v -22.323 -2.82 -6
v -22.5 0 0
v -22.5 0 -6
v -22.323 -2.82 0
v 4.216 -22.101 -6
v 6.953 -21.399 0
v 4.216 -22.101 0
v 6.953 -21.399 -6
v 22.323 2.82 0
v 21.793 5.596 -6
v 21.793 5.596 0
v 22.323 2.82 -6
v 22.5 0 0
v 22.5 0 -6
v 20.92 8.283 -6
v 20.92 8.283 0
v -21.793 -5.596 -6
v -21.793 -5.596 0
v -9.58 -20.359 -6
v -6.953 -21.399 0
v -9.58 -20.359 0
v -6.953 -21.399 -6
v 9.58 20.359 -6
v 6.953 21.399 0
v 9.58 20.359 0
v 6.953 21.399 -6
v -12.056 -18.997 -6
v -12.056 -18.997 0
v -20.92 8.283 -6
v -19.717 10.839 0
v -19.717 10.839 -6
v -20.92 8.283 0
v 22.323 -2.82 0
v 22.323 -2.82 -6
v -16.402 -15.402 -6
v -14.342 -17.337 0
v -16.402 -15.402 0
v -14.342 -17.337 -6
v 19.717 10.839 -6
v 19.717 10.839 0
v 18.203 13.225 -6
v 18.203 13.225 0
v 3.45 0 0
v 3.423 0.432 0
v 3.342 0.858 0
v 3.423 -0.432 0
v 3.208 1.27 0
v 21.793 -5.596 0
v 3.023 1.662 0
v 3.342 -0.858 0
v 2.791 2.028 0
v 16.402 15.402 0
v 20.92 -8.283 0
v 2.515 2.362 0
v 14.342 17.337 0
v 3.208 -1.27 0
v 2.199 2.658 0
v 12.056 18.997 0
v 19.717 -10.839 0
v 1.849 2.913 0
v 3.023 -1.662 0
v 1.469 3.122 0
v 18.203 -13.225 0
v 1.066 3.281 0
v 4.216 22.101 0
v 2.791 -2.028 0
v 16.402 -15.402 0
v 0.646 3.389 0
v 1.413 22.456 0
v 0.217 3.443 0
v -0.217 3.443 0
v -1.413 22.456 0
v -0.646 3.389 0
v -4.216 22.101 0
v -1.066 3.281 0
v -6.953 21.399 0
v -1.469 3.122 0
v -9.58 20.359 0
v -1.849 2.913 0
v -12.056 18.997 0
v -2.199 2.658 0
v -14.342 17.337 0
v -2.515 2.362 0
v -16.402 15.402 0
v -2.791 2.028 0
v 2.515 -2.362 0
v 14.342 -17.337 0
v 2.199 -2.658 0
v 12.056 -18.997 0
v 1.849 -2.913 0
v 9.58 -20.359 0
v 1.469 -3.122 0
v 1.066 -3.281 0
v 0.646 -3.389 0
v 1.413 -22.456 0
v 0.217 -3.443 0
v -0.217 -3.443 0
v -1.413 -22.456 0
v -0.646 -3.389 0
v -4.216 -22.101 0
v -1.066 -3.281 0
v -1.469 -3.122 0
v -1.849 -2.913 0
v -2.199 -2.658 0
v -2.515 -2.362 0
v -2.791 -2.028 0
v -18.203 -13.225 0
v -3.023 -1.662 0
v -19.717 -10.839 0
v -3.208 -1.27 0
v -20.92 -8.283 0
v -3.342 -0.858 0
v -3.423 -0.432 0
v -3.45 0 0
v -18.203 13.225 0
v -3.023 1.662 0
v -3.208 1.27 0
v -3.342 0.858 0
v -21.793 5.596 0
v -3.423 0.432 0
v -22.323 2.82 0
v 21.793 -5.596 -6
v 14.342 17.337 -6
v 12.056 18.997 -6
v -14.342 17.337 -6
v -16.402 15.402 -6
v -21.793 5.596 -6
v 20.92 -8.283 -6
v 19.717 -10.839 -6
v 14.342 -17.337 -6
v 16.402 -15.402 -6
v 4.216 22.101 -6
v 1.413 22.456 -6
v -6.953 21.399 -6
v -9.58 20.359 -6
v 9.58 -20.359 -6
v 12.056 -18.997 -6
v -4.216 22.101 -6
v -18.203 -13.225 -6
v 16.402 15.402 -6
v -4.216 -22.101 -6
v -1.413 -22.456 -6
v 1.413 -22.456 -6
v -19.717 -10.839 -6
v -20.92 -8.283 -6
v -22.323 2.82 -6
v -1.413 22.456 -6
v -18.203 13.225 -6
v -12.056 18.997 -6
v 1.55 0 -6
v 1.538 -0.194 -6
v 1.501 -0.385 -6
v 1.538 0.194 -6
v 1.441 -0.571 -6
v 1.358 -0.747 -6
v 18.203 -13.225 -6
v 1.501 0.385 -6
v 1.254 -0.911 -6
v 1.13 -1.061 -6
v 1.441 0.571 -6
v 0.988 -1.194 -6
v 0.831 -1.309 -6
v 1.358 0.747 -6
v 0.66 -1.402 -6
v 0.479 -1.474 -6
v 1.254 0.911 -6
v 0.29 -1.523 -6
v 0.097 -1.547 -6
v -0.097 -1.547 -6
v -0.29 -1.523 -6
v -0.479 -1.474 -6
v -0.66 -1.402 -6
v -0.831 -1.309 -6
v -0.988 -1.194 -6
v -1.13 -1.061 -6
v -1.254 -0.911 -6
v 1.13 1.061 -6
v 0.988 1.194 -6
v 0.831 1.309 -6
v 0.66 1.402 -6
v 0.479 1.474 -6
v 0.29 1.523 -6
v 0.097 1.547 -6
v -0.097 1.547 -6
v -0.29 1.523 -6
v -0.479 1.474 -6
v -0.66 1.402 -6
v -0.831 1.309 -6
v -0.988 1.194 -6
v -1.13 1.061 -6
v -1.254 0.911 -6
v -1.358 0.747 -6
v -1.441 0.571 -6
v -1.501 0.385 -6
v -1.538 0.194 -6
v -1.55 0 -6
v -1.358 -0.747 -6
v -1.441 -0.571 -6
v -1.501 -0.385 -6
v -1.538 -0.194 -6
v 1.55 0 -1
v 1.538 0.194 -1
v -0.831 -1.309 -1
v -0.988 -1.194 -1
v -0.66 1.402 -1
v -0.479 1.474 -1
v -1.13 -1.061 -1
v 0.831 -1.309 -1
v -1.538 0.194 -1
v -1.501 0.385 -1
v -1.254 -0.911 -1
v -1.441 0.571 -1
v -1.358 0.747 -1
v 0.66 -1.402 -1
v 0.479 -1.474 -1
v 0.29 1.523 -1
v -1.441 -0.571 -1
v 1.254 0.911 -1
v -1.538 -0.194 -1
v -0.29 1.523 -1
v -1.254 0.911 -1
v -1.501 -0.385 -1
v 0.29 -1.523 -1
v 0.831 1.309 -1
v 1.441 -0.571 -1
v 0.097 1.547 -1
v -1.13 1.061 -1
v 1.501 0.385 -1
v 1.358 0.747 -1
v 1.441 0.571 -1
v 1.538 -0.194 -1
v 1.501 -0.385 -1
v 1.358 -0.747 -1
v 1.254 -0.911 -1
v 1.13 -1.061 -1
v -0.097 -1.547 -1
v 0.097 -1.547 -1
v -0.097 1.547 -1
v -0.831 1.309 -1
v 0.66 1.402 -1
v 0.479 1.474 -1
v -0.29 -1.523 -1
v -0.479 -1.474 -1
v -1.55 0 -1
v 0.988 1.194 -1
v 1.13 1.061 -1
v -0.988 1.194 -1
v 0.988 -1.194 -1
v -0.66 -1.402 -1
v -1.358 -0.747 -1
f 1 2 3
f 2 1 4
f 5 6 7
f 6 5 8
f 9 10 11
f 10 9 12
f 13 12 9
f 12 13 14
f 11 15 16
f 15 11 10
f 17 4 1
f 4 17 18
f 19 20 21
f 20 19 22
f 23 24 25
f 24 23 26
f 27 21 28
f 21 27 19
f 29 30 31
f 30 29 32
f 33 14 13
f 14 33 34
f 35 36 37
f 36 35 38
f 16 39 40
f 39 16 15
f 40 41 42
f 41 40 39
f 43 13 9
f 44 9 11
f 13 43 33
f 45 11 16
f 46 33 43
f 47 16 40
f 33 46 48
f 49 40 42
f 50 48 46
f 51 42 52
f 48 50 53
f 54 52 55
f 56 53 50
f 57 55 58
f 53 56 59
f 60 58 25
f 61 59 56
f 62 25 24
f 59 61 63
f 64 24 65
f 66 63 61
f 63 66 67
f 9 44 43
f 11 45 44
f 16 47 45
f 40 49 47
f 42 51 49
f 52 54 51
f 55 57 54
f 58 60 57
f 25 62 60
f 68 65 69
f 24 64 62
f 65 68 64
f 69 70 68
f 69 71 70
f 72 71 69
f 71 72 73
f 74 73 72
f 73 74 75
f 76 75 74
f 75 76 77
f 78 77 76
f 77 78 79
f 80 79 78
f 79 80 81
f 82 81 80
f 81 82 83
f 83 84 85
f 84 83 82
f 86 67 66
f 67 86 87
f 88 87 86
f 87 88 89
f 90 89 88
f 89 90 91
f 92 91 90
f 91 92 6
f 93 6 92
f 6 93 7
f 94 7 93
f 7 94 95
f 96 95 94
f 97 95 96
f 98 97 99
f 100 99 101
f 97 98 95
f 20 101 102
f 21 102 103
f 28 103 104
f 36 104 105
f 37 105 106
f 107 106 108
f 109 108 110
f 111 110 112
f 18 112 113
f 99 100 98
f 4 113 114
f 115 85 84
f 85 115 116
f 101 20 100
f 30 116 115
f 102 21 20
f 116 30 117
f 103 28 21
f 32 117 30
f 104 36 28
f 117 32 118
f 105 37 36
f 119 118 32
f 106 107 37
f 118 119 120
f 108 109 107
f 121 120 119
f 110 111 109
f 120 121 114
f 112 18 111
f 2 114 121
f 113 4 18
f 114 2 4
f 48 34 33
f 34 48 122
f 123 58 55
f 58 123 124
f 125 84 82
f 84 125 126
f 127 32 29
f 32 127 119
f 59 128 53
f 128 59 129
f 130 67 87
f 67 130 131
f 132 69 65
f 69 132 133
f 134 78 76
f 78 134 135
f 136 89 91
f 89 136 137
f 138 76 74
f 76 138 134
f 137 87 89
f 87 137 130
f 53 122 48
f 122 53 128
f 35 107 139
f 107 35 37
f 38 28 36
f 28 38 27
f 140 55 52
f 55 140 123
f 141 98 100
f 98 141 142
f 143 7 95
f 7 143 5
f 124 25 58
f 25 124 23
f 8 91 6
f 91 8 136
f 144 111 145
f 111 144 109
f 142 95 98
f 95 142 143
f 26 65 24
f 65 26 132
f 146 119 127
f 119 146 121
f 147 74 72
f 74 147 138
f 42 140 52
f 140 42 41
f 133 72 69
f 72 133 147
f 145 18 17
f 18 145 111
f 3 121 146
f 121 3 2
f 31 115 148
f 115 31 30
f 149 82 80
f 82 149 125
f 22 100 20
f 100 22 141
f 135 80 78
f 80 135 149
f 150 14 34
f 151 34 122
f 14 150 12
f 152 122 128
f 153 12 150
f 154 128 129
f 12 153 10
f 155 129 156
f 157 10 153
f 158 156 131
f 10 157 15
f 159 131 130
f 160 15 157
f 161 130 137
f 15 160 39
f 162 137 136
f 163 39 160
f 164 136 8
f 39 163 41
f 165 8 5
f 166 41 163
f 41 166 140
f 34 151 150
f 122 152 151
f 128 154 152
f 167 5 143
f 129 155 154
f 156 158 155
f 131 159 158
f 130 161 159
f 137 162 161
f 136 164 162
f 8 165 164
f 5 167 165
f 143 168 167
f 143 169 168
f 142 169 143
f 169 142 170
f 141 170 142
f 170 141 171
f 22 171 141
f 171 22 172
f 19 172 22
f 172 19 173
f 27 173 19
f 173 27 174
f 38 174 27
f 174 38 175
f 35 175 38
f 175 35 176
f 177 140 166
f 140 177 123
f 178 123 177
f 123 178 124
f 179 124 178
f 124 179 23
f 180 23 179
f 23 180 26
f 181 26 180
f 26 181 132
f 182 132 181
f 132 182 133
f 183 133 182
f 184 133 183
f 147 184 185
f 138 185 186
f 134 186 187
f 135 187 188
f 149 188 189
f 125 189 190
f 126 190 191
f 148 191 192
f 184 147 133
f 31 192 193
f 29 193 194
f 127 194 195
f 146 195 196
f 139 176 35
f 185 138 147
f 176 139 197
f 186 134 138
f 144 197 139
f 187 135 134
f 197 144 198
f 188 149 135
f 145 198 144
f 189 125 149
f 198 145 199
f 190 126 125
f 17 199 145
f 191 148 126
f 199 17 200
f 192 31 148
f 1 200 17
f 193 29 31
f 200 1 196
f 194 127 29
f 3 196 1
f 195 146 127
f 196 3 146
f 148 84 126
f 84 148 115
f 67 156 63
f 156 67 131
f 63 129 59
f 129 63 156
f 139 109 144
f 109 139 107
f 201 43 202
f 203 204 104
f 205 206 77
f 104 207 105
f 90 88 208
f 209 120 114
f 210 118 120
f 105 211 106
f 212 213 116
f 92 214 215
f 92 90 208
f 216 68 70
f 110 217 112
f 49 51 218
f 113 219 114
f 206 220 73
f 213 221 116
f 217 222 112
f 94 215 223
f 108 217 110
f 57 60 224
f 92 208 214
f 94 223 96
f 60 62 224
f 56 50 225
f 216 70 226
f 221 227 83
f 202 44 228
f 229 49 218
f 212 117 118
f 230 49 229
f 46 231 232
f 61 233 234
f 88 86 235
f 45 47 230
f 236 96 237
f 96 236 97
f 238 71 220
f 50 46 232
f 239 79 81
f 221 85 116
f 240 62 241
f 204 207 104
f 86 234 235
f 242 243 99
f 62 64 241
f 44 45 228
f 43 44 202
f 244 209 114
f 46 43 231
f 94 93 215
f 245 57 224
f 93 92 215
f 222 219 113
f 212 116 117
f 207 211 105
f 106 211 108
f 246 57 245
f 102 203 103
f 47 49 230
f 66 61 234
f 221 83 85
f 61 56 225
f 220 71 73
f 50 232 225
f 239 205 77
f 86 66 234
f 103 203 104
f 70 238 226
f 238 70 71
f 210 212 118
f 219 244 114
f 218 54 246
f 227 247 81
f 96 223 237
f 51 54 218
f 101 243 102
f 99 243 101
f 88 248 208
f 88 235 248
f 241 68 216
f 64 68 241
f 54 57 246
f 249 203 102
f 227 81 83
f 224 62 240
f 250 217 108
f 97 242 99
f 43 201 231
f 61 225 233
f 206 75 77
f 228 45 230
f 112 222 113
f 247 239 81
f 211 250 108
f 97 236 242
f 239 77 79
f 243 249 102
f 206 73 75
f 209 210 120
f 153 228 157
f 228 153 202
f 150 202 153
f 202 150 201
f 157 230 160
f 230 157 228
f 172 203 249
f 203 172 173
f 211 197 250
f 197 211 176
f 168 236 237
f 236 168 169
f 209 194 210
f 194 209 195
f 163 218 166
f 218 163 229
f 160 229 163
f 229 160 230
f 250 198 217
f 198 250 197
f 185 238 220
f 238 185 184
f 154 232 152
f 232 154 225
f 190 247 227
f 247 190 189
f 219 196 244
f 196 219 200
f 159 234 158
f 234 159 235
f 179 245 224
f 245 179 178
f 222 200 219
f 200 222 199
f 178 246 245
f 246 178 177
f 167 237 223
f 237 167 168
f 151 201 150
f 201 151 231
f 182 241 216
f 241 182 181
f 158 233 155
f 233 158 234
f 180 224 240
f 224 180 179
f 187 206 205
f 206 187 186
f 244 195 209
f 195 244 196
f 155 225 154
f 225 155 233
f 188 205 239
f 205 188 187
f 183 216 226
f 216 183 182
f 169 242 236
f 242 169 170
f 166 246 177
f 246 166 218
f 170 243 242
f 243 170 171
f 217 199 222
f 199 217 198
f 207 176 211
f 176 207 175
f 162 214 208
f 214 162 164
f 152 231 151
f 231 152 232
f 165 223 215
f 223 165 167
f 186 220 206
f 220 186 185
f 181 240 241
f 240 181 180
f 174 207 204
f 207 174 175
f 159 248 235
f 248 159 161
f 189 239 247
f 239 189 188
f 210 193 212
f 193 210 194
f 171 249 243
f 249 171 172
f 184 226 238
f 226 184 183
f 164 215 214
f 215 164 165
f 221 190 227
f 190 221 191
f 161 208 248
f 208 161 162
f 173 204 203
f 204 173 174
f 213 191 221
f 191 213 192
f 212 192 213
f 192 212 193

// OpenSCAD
$fn = 50;


difference() {
	union() {
		translate(v = [0, 0, -6.0000000000]) {
			cylinder(h = 6, r = 22.5000000000);
		}
		translate(v = [0, 0, -6.0000000000]) {
			cylinder(h = 6, r = 2.8750000000);
		}
	}
	union() {
		translate(v = [0, 0, 0]) {
			rotate(a = [0, 0, 0]) {
				difference() {
					union() {
						translate(v = [0, 0, -6.0000000000]) {
							cylinder(h = 6, r = 1.2500000000);
						}
						translate(v = [0, 0, -1.0000000000]) {
							cylinder(h = 1.0000000000, r1 = 1.5500000000, r2 = 3.4500000000);
						}
						translate(v = [0, 0, -6.0000000000]) {
							cylinder(h = 6, r = 1.5500000000);
						}
						translate(v = [0, 0, -6.0000000000]) {
							cylinder(h = 6, r = 1.2500000000);
						}
					}
					union();
				}
			}
		}
	}
}
